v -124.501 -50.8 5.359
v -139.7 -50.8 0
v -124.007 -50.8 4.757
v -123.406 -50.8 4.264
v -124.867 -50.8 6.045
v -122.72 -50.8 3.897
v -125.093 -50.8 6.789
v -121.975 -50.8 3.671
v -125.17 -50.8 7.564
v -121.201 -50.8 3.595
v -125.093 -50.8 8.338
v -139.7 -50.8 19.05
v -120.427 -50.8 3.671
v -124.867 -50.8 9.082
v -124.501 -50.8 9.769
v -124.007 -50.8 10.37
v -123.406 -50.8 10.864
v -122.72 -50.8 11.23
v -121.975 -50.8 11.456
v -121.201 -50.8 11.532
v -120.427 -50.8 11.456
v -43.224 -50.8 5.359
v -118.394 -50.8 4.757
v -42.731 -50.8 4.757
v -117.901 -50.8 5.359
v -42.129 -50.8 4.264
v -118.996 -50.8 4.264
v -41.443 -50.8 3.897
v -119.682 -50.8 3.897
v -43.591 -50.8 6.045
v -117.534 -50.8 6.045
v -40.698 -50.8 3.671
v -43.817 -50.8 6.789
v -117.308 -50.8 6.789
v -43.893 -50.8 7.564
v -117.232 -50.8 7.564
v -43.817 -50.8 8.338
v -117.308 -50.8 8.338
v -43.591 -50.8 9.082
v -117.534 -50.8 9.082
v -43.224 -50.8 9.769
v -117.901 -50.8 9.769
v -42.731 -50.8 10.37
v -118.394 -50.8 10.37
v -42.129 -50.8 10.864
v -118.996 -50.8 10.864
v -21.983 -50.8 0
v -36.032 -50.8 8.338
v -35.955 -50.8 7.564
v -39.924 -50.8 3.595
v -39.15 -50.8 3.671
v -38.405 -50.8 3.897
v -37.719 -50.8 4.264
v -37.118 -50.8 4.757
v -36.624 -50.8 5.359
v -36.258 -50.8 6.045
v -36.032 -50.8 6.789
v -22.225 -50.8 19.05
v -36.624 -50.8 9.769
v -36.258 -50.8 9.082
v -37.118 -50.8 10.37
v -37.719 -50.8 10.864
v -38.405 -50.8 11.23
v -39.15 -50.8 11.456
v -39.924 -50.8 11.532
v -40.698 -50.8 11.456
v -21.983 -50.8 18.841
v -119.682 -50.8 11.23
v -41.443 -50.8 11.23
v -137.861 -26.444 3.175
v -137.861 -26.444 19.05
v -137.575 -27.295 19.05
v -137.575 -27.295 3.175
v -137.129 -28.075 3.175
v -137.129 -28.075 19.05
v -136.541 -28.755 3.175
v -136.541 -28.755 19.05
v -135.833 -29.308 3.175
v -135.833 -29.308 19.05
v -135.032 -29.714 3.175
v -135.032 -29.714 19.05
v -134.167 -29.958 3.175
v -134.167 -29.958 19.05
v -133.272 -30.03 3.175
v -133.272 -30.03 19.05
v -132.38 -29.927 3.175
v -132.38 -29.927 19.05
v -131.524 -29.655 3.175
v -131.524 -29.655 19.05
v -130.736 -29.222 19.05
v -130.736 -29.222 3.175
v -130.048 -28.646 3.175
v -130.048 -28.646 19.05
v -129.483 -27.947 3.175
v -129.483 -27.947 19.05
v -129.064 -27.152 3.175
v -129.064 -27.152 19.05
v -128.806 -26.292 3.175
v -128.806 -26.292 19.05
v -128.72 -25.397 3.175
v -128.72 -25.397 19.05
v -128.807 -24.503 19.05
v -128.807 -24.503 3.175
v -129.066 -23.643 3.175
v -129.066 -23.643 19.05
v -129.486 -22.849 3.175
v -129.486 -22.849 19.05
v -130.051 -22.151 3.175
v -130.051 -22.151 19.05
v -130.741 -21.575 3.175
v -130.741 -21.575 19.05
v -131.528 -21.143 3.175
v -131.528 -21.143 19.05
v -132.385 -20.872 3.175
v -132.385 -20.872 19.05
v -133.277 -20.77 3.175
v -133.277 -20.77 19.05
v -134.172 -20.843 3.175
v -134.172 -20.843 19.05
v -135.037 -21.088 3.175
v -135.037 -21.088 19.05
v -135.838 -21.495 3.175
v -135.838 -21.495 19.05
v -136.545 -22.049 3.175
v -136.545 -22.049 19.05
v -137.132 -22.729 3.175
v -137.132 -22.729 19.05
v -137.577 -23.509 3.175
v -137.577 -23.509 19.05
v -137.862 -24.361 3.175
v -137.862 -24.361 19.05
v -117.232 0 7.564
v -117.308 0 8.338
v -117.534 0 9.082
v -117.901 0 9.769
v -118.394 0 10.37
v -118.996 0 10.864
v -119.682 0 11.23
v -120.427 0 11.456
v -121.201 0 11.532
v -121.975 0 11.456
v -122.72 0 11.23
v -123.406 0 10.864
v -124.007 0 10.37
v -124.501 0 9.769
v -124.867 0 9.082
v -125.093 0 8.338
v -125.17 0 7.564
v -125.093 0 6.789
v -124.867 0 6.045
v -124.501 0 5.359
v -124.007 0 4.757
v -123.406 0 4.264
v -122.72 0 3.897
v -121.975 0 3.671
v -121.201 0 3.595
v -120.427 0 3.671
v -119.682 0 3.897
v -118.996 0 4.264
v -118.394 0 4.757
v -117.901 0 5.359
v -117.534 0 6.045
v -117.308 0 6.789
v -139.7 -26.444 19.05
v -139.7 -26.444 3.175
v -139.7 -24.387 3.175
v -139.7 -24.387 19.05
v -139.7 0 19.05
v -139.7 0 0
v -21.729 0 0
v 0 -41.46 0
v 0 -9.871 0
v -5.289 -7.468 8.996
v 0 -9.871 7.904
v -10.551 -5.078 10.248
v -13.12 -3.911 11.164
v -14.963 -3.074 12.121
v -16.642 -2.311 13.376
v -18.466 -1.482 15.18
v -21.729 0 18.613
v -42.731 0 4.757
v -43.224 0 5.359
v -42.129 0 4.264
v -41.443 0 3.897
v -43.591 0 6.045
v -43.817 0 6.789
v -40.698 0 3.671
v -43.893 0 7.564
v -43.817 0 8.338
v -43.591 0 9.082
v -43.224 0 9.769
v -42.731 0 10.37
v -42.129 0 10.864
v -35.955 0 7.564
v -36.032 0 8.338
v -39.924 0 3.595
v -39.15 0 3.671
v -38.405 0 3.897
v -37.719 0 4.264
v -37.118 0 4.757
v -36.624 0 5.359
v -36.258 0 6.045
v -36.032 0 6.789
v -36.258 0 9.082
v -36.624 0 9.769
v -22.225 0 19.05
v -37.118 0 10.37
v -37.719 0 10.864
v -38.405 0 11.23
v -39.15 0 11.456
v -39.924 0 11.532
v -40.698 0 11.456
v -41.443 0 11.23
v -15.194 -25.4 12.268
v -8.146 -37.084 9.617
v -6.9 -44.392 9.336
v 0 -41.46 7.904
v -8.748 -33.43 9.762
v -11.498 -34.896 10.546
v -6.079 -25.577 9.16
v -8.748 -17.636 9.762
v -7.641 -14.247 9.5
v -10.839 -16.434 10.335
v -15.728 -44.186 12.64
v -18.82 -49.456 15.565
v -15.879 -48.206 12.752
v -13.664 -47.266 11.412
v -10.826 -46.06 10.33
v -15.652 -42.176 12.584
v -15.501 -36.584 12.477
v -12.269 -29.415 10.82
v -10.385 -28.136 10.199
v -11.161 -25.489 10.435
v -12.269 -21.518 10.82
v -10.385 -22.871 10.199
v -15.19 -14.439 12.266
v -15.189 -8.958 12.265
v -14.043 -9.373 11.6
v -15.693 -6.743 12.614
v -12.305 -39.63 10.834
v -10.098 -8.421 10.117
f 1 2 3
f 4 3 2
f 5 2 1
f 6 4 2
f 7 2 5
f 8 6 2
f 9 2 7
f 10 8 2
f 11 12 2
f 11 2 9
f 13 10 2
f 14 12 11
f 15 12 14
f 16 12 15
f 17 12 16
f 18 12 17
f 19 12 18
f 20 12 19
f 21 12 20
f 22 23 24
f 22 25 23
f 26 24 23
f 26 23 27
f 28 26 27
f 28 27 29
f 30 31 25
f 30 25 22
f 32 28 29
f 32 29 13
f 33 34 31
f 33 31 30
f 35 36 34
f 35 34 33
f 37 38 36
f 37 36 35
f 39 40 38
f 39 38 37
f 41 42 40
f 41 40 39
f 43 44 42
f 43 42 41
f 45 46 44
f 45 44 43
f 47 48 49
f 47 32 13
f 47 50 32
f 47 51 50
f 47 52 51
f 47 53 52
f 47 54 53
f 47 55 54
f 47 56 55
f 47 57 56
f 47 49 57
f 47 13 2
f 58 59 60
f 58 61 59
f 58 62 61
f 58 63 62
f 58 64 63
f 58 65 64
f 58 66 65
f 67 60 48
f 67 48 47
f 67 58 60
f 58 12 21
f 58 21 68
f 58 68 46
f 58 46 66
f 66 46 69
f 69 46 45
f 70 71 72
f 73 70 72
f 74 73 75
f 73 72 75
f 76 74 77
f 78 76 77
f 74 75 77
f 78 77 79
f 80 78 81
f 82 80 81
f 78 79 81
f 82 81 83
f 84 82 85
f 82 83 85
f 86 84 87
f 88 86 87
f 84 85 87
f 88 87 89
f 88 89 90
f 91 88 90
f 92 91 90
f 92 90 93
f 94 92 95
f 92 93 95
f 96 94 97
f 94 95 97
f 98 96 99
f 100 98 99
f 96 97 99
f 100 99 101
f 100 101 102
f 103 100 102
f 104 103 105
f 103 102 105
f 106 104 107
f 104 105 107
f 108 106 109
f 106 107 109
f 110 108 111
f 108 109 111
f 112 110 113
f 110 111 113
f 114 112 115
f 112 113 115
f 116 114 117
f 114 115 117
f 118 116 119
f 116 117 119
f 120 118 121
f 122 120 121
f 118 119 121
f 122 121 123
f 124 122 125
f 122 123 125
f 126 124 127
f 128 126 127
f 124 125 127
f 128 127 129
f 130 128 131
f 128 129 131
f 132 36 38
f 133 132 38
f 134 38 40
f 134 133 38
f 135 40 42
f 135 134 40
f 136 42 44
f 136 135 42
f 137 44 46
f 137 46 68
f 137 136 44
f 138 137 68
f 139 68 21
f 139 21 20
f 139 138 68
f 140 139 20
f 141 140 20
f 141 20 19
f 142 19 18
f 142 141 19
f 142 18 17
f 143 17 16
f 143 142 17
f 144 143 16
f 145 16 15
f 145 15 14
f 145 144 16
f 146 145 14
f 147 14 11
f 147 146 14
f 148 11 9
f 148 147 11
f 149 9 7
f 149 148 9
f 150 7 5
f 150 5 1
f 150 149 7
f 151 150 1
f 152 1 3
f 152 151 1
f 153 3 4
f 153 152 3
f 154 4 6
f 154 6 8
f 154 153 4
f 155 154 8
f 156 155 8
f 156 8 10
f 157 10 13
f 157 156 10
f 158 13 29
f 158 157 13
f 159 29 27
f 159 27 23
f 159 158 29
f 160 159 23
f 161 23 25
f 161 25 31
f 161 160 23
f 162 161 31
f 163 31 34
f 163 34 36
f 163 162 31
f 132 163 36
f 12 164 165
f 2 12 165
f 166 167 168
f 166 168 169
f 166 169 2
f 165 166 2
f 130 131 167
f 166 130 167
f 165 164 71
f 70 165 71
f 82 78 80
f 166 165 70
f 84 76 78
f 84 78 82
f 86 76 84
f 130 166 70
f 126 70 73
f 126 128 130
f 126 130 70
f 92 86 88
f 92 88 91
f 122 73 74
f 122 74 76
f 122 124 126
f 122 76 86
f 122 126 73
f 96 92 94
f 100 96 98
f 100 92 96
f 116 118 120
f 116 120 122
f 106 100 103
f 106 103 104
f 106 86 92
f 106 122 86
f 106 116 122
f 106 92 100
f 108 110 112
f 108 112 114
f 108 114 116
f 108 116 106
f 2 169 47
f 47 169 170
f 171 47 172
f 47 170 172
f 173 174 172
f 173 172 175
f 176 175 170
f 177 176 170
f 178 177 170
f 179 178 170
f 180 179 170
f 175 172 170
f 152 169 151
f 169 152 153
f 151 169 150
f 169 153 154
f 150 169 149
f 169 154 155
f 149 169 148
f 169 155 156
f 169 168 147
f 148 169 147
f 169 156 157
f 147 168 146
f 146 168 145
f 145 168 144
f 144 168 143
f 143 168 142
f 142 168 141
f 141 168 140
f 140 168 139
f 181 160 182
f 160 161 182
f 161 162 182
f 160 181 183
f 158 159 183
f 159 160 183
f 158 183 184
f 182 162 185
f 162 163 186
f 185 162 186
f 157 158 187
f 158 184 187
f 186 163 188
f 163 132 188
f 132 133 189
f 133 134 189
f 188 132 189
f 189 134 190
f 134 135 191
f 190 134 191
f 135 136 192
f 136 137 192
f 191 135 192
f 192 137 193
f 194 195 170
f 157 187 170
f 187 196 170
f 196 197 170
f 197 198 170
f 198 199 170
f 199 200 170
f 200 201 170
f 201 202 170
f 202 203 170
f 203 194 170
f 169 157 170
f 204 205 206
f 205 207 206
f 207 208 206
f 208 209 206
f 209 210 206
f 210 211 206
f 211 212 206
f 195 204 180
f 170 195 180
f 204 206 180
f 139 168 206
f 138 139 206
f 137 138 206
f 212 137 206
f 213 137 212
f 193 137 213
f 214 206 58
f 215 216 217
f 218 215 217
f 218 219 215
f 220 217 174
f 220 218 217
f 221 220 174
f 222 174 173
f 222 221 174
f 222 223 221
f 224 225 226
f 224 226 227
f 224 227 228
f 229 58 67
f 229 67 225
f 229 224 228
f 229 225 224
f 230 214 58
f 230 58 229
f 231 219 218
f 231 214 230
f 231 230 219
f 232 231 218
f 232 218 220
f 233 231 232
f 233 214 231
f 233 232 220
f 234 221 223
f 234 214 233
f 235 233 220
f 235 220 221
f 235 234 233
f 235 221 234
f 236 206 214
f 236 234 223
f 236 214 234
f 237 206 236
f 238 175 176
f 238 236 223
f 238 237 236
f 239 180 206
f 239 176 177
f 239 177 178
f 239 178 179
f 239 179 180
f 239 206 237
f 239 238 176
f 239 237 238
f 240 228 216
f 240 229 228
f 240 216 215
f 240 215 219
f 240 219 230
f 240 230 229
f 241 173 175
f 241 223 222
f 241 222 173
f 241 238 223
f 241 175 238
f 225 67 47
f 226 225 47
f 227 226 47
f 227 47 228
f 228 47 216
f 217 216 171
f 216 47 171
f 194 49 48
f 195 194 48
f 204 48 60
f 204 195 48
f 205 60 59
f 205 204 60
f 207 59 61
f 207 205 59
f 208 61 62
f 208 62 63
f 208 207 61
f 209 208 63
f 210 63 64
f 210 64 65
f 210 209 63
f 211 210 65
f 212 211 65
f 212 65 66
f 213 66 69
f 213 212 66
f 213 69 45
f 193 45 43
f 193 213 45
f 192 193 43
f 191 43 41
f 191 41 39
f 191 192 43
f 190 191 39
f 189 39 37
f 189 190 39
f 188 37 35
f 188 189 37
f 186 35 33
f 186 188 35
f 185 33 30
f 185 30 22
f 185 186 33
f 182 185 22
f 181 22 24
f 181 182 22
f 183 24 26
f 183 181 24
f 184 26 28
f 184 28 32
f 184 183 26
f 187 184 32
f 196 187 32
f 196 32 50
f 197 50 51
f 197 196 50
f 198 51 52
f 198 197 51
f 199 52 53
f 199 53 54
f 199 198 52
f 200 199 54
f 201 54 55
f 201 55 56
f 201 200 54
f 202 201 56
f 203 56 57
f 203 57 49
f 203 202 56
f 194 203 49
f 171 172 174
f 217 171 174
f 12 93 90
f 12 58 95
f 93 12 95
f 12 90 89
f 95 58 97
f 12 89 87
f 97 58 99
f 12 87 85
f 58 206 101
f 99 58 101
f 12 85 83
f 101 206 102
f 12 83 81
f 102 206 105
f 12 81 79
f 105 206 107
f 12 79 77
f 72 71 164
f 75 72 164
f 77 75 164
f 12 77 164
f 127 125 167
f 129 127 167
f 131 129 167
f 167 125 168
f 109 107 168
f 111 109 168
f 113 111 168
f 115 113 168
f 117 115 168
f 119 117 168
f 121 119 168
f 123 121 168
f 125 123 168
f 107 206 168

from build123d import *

# Parameters (mm, degrees)
F0_R     = 3.96875
F1_DEPTH = 50.8
F3_DEPTH = 15.875
F6_DEPTH = 25.4
F8_DEPTH = 25.4


with BuildPart() as f1:
    # F0 (on Front) → F1 (new body)
    with BuildSketch(Plane.XZ):
        with BuildLine():
            Line((-139.7, 0), (0, 0))
            Line((0, 0), (0, 7.903855294))
            add(Edge.make_bspline(
                [(-22.225, 19.05), (-19.6667376265, 16.8833683971), (-15.7418485572, 10.4875386248), (-6.5614327707, 9.3293877219), (0, 7.903855294)],
                knots=[0, 0, 0, 0, 0.4401240907, 1, 1, 1, 1], degree=3))
            Line((-22.225, 19.05), (-139.7, 19.05))
            Line((-139.7, 19.05), (-139.7, 0))
        make_face()
        with Locations((-121.2008071616, 7.5636314338)):
            Circle(F0_R, mode=Mode.SUBTRACT)
        with Locations((-39.9241782725, 7.5636314338)):
            Circle(F0_R, mode=Mode.SUBTRACT)
    extrude(amount=F1_DEPTH)

    # F2 (on face) → F3 (cut)
    with BuildSketch(Plane.XY.offset(19.05)):
        with BuildLine():
            Line((-139.7, -26.4440402389), (-137.8610034316, -26.4440402389))
            ThreePointArc((-137.8610034316, -26.4440402389), (-128.7197553381, -25.3974799855), (-137.8621371984, -24.360870613))
            Line((-137.8621371984, -24.360870613), (-139.7, -24.3874061853))
            Line((-139.7, -24.3874061853), (-139.7, -26.4440402389))
        make_face()
    extrude(amount=-F3_DEPTH, mode=Mode.SUBTRACT)

    # F5 (on face) → F6 (cut)
    with BuildSketch(Plane(origin=(0, 0, 0), x_dir=(1, 0, 0), z_dir=(0, 0, -1))):
        Polygon((-21.9825431705, 50.8), (0, 41.4597280324), (0, 50.8), align=None)
    extrude(amount=-F6_DEPTH, mode=Mode.SUBTRACT)

    # F7 (on face) → F8 (cut)
    with BuildSketch(Plane(origin=(0, 0, 0), x_dir=(1, 0, 0), z_dir=(0, 0, -1))):
        Polygon((0, 9.8713636398), (-21.7288583517, 0), (0, 0), align=None)
    extrude(amount=-F8_DEPTH, mode=Mode.SUBTRACT)


solid = f1.part
